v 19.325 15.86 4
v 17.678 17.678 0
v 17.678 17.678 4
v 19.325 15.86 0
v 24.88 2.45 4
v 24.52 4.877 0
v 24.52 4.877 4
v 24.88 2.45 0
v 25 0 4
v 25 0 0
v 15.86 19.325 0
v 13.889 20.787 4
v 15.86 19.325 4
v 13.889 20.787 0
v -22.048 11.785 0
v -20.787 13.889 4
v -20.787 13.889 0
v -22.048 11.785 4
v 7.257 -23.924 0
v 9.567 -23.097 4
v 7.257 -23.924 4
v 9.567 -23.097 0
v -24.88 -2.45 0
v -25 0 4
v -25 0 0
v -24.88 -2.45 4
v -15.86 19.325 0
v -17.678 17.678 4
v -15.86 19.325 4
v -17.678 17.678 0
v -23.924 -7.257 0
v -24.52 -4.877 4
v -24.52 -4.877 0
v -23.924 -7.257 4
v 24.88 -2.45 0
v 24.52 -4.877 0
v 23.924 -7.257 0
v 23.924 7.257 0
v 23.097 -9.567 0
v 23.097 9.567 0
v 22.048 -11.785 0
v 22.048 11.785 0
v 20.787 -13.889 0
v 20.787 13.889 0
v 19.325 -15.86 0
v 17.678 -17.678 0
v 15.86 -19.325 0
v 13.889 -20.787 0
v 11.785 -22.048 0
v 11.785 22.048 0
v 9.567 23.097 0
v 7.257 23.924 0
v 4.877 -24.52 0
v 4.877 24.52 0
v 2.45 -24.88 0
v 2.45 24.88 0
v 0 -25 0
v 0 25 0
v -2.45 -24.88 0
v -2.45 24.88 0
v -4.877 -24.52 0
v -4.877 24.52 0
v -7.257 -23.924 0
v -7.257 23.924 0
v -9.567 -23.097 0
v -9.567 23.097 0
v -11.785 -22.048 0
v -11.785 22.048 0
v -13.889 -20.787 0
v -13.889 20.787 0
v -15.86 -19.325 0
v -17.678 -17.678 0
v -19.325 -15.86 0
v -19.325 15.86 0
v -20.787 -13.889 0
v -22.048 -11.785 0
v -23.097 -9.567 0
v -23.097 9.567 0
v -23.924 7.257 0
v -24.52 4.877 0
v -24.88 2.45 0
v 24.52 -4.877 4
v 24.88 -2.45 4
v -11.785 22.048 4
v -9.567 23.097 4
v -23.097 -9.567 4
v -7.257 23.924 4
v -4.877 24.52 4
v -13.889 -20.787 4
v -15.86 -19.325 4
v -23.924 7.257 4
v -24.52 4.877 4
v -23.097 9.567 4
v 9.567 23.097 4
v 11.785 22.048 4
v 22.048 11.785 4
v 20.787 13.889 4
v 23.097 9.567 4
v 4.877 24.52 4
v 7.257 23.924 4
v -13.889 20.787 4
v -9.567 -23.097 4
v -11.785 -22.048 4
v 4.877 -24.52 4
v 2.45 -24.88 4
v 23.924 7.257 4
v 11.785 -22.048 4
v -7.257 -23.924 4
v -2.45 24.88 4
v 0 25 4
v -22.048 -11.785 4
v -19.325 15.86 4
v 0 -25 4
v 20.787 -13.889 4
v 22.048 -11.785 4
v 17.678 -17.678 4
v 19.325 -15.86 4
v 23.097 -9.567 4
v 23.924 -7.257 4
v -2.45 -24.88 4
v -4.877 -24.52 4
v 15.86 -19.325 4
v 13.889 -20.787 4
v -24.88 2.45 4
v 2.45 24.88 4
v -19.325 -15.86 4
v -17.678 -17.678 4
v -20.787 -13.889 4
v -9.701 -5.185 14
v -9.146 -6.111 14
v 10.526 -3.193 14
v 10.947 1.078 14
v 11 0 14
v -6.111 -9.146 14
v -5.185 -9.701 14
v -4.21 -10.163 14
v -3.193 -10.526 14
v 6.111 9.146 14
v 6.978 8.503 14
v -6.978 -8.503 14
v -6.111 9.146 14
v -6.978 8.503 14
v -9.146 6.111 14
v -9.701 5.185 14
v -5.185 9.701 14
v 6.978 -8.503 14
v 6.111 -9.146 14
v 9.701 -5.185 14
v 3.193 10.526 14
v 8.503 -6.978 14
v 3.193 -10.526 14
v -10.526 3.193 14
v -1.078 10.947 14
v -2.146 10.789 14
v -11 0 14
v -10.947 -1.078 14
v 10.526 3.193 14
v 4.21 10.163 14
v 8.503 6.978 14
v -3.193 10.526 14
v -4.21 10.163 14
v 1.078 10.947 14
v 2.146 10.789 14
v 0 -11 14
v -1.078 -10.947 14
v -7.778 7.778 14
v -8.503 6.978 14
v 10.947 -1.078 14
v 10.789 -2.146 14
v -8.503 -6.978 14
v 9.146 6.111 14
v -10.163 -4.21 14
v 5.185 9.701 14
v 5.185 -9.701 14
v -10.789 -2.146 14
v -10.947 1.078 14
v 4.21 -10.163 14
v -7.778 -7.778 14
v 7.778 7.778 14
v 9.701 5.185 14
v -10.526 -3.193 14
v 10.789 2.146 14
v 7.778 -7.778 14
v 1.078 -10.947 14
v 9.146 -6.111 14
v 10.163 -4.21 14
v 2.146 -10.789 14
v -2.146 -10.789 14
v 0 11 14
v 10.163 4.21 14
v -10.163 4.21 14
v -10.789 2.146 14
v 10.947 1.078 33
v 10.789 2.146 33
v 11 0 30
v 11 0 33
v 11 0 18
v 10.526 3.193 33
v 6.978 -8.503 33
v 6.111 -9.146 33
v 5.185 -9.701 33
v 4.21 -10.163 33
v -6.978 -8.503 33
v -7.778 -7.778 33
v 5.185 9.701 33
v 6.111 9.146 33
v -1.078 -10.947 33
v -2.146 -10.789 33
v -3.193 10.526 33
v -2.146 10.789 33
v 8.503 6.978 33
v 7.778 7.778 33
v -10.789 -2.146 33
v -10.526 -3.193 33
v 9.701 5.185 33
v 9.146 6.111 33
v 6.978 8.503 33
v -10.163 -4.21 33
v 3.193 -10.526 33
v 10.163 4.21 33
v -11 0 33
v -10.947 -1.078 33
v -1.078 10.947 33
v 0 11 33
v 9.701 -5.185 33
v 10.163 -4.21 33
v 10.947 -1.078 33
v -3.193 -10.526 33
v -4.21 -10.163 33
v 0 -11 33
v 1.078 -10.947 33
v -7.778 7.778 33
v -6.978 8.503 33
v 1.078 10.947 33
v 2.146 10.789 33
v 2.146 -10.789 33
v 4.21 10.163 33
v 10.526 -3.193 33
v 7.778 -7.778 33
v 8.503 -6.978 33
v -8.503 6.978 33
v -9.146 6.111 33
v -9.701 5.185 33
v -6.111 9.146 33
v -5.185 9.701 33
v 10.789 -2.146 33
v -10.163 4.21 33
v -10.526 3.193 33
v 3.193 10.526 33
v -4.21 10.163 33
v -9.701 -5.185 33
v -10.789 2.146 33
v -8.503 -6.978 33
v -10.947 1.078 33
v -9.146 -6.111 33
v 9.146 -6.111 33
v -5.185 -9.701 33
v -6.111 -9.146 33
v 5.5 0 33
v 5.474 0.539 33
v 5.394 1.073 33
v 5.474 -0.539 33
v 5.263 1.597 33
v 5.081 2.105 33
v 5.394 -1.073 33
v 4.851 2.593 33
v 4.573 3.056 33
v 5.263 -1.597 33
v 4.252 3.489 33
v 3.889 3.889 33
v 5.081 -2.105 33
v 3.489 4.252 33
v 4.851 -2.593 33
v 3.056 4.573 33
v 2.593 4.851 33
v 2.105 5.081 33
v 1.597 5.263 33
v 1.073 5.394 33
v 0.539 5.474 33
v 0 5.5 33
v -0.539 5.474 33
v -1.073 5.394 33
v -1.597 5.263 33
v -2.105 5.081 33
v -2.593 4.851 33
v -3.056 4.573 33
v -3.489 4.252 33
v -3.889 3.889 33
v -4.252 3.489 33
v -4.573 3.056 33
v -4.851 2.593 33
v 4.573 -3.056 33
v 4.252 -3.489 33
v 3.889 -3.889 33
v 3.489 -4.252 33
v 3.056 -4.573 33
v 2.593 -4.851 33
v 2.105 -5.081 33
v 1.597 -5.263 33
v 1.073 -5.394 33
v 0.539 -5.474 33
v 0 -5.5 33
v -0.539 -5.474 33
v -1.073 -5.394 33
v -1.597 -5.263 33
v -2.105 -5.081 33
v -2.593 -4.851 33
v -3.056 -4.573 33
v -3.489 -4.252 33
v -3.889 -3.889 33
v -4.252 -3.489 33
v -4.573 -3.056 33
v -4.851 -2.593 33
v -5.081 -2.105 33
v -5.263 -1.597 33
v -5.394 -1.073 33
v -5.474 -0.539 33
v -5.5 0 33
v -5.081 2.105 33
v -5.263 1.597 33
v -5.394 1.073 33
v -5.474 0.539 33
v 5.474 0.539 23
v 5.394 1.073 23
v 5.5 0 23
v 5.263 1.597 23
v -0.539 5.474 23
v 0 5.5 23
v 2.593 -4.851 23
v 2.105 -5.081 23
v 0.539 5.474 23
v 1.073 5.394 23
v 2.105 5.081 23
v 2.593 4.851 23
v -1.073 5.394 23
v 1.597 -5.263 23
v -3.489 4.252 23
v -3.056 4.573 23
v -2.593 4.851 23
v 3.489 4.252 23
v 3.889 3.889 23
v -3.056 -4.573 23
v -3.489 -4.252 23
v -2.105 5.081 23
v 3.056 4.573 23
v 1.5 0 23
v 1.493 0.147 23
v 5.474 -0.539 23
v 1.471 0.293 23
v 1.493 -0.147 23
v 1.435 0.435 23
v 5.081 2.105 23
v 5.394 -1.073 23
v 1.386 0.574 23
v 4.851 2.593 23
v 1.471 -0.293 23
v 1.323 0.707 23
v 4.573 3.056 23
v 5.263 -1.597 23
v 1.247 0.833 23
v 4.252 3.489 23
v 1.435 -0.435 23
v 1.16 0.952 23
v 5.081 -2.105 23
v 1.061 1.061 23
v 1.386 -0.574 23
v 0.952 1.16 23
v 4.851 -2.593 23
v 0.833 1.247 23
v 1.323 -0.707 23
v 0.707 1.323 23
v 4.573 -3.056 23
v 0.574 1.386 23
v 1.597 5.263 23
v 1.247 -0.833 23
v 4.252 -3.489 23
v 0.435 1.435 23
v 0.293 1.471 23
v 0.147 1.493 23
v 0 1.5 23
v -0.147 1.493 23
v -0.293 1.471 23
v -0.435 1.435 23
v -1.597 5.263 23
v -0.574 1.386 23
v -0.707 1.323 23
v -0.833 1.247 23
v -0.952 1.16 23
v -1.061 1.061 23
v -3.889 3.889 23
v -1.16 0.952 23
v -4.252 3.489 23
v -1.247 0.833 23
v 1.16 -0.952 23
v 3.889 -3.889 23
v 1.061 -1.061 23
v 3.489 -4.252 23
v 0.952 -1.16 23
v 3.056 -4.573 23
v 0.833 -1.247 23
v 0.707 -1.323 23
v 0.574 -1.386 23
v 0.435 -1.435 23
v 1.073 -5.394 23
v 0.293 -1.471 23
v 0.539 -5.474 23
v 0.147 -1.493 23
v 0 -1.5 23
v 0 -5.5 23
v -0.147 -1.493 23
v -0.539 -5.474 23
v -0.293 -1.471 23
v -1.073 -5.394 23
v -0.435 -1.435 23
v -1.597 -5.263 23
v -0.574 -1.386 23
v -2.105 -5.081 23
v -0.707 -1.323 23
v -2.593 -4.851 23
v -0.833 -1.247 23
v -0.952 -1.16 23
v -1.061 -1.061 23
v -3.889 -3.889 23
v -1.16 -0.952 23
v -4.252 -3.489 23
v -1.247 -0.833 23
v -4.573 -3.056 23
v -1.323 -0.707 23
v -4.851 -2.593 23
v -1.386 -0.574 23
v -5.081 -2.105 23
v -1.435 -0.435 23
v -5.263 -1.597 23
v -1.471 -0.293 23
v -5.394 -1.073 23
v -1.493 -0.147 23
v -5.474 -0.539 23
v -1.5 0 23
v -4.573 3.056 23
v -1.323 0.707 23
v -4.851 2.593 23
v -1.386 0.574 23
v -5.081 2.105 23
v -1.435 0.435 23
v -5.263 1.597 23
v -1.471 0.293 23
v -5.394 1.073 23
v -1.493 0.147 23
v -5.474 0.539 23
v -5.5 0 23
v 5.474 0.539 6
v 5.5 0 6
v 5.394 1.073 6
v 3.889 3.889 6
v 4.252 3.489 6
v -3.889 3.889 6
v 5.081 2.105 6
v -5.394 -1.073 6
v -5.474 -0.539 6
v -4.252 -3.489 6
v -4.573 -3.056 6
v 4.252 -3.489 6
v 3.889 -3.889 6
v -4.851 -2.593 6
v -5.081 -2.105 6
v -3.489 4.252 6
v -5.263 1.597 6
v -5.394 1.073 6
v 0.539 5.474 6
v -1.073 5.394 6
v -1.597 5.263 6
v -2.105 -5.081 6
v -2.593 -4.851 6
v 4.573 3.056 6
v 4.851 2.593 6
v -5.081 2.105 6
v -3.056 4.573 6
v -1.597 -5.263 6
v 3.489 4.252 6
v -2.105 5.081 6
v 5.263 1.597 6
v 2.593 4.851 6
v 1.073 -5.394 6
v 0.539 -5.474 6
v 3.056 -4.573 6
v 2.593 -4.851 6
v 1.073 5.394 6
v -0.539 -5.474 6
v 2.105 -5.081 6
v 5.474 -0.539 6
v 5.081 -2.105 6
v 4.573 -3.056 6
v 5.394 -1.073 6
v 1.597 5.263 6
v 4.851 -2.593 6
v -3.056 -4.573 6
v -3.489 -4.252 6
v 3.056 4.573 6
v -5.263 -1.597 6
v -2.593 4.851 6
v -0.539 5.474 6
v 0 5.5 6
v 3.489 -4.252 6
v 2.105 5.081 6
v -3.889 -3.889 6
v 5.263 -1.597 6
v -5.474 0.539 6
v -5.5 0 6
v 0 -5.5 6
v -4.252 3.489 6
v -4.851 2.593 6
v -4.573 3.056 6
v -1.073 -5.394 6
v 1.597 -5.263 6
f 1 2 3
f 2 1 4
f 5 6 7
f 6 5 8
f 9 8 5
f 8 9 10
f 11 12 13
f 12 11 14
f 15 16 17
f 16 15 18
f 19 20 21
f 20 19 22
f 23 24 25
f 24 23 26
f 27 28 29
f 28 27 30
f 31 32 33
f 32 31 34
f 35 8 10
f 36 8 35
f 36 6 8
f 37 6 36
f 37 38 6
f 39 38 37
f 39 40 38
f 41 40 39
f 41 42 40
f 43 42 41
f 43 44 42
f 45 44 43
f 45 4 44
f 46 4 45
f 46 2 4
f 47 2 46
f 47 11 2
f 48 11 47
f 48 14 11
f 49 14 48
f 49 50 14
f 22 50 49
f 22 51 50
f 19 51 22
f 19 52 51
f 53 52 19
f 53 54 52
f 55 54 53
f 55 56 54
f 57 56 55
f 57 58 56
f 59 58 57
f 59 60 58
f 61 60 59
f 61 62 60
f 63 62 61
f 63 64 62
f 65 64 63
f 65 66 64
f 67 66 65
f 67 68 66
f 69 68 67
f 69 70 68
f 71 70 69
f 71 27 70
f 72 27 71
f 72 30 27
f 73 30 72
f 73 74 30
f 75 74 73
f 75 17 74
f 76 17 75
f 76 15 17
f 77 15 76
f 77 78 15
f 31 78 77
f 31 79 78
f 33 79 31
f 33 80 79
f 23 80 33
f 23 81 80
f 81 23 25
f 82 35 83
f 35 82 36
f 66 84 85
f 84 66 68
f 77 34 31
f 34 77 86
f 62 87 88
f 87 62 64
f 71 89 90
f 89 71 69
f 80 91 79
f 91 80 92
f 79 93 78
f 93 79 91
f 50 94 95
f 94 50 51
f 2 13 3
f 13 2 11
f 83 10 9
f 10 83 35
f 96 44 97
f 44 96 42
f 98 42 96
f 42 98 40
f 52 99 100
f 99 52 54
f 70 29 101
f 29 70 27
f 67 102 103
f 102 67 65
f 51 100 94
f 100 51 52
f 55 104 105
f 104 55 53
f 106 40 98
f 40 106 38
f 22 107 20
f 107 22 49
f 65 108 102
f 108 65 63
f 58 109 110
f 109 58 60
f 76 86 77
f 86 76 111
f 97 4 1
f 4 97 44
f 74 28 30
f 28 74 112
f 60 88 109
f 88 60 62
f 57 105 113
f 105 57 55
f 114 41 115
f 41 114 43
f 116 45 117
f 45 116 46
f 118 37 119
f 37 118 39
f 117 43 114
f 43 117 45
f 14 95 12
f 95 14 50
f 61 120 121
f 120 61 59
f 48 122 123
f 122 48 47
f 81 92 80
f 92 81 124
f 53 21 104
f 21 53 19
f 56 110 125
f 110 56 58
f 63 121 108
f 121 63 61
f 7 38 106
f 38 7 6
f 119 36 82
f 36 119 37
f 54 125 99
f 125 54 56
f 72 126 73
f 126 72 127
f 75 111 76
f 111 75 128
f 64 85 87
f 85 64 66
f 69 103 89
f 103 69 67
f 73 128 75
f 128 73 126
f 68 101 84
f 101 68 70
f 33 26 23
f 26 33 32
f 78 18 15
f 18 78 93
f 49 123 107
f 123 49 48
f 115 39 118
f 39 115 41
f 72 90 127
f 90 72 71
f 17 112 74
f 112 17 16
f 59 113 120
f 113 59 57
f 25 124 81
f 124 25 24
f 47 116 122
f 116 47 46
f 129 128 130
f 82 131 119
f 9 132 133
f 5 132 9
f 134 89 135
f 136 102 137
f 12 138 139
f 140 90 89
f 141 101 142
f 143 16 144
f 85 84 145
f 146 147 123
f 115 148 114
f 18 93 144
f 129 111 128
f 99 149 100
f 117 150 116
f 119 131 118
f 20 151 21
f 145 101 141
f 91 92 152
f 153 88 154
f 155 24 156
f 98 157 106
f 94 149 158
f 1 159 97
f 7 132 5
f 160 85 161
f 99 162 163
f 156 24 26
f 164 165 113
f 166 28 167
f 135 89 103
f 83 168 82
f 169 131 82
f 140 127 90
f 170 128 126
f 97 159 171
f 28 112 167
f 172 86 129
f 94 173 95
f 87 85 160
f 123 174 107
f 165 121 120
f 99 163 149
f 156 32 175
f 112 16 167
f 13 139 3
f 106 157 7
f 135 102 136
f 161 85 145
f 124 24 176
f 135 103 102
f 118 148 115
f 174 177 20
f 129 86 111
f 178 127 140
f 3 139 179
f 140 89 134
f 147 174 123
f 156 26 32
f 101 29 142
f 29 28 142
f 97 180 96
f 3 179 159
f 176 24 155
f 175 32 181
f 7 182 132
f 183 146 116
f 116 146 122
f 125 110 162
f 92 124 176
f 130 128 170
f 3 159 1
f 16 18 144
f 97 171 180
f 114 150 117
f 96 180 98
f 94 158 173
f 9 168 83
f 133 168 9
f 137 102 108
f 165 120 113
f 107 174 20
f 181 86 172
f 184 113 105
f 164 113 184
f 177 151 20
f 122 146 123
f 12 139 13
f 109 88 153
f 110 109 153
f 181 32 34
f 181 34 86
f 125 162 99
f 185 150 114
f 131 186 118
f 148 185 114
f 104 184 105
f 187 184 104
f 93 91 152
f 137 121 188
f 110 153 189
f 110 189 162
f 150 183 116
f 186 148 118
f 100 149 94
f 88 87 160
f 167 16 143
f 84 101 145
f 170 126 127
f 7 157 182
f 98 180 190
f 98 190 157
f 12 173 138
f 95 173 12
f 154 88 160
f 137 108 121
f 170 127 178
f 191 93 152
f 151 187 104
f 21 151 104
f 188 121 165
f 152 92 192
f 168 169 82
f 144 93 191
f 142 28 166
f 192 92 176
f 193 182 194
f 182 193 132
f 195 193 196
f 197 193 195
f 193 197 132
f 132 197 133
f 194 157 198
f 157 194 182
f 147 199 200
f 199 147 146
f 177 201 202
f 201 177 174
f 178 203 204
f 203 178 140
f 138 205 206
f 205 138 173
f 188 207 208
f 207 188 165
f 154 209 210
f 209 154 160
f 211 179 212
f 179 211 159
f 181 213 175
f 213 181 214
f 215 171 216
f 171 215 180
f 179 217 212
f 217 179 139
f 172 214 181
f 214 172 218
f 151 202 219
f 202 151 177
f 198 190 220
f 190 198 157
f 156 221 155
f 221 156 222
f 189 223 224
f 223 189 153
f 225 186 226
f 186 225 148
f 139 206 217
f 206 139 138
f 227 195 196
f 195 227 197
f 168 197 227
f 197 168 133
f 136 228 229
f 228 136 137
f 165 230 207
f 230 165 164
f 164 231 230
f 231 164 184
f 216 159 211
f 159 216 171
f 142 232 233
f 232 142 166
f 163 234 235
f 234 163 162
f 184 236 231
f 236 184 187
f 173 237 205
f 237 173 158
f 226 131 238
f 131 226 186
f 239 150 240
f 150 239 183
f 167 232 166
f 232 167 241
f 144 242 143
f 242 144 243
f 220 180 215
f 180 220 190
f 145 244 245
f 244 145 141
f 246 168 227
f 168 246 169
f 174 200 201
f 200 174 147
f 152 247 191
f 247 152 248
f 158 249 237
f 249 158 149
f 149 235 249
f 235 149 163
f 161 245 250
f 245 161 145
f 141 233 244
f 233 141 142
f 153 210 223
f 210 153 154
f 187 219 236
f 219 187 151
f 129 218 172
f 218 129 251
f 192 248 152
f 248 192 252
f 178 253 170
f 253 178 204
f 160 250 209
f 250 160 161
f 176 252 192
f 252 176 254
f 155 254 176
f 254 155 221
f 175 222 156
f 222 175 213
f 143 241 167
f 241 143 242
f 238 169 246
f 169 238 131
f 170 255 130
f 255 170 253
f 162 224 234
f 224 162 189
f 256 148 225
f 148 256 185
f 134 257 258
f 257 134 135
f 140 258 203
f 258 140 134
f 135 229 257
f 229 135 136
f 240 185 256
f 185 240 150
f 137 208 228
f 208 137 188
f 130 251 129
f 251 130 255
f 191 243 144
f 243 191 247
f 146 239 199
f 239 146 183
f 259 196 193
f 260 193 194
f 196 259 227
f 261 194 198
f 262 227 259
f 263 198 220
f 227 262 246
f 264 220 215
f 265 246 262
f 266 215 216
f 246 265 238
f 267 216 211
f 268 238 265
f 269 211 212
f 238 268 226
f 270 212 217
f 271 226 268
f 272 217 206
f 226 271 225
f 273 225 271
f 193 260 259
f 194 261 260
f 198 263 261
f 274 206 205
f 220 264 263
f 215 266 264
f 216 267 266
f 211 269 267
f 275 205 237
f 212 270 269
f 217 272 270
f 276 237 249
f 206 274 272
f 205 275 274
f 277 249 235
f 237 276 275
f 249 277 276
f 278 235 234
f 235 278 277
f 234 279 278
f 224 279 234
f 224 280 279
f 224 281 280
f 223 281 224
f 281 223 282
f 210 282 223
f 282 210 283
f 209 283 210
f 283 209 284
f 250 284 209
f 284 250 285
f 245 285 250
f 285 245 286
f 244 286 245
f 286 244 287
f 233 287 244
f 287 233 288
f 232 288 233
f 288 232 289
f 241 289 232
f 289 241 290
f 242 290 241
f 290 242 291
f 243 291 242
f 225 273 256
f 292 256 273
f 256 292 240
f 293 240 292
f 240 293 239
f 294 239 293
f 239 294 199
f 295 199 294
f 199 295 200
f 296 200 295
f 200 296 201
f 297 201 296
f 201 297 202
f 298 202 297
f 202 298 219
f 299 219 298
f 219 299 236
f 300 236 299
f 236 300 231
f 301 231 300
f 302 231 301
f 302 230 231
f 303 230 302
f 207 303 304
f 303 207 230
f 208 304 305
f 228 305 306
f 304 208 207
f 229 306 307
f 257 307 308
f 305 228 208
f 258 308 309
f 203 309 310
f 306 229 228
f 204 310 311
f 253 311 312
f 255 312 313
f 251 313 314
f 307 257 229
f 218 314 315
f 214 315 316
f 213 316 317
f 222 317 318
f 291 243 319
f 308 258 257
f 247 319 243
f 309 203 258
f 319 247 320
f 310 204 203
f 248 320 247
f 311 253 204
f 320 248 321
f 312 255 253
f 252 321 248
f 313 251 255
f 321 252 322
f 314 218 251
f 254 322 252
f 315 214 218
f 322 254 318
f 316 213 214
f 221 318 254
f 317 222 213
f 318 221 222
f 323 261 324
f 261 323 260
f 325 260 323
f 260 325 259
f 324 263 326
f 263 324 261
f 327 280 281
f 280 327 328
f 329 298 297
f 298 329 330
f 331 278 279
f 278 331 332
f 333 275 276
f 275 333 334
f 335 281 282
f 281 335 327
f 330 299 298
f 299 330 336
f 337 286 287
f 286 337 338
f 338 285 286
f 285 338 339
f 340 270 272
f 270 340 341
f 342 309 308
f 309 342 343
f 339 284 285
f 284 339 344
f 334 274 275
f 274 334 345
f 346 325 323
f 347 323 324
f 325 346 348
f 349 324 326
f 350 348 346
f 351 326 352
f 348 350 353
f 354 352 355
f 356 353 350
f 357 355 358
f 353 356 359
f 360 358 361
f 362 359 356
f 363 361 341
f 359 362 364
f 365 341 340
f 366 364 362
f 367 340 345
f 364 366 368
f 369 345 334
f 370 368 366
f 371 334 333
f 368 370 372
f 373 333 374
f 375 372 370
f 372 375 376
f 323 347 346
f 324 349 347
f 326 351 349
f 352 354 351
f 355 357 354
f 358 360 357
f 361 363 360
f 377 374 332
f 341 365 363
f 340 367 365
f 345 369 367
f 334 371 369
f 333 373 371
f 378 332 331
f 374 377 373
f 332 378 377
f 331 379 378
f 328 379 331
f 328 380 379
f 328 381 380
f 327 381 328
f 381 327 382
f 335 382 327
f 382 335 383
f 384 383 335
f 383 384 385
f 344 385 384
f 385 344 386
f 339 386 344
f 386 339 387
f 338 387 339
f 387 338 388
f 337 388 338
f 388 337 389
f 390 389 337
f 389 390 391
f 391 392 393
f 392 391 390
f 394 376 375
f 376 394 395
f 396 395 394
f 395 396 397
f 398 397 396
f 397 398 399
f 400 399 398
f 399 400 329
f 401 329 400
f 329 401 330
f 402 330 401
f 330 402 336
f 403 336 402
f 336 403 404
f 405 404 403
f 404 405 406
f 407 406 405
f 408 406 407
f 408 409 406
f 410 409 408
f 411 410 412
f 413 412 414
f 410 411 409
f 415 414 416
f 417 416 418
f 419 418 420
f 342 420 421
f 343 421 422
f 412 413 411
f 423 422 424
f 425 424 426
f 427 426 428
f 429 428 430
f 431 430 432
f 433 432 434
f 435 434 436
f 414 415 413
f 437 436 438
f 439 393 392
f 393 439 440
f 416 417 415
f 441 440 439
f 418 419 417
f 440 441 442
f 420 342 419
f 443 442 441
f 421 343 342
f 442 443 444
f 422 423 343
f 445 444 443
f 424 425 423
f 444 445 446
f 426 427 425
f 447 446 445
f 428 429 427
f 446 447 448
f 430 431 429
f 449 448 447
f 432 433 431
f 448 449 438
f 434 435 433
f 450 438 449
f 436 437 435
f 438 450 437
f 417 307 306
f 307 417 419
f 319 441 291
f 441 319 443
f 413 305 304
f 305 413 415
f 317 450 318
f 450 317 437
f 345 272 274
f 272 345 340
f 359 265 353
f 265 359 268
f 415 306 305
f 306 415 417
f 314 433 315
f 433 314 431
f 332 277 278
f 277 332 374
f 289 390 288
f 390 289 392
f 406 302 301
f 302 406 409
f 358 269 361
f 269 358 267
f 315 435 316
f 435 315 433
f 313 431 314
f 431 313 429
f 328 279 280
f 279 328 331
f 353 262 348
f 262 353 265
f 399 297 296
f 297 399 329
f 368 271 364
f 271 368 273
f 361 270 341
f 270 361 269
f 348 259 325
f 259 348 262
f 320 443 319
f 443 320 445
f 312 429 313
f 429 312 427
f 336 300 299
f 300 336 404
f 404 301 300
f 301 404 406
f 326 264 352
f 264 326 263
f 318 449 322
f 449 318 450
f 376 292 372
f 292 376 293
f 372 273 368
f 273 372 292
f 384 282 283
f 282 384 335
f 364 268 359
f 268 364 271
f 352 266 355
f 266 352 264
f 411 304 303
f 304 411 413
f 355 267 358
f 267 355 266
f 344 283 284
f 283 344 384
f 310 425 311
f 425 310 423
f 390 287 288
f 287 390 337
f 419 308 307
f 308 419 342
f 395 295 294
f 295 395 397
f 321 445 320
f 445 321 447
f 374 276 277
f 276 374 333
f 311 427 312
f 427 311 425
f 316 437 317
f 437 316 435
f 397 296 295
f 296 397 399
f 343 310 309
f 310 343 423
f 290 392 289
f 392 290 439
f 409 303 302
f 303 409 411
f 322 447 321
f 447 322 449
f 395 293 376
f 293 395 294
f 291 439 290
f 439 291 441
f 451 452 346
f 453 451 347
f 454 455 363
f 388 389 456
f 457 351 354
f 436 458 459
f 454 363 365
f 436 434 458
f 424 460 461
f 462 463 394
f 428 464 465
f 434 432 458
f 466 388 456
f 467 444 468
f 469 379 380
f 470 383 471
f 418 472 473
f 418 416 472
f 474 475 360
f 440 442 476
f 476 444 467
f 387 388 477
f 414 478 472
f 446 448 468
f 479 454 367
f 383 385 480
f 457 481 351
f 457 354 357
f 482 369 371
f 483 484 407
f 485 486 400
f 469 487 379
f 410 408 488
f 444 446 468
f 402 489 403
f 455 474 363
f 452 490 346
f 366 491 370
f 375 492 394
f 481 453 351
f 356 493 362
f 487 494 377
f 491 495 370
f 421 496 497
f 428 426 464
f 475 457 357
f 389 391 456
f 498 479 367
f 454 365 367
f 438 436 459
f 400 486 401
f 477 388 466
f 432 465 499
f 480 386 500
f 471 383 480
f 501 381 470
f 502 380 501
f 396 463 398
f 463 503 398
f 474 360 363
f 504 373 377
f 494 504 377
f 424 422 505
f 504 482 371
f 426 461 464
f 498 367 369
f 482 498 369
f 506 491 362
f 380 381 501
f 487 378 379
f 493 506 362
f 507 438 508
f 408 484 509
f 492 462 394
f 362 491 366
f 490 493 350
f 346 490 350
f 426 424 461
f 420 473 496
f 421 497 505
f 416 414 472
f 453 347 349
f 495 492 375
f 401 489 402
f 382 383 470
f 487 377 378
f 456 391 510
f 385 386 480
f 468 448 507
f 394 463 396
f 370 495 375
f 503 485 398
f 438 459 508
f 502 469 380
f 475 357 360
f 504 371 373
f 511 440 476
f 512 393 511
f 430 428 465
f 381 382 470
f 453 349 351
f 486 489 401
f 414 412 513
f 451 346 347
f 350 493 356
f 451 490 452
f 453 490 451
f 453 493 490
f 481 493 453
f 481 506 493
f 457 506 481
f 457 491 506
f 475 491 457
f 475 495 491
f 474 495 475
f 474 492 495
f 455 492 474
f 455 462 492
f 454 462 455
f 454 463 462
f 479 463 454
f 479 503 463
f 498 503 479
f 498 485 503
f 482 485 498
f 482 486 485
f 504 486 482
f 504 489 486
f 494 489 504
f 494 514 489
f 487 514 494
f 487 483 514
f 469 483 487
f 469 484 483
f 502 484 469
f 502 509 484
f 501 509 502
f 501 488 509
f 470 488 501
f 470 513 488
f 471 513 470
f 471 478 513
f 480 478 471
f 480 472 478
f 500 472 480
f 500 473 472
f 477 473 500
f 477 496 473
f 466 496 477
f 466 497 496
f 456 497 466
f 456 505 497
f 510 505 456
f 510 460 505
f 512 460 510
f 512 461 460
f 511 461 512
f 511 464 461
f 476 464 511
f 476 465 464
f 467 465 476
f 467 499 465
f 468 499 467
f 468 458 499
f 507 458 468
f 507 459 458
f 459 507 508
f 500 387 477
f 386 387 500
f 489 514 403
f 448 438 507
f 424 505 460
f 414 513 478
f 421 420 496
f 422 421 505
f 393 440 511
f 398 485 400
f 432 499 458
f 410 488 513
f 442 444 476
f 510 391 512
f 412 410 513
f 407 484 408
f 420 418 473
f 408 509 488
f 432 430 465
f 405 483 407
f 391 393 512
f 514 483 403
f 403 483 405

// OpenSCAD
// 1.5 mL microcentrifuge tube stand for an analytical balance
// Printed standing up: rests on XY plane at z = 0, builds upward (+Z), centred on origin.

$fn = 64;

// ---- Overall body dimensions (mm) ----
base_d     = 50;   // base disc diameter
base_h     = 4;    // base disc height (z = 0 .. 4)
cone_top_d = 22;   // cone narrows to this diameter at z = 14
cone_h     = 10;   // cone height (z = 4 .. 14)
col_d      = 22;   // column diameter
col_h      = 19;   // column height (z = 14 .. 33)
top_z      = 33;   // top of the stand

// ---- Tube seat (bore) dimensions ----
seat_d = 11;       // seat bore diameter (z = 33 .. 23)
seat_h = 10;       // seat bore height (z = 23 .. 33)
tip_d  = 3;        // cone bore narrows to this at z = 6
tip_h  = 17;       // cone bore height (z = 6 .. 23)

// ---- Viewing window dimensions ----
win_w  = 4;        // window width in Y
win_z0 = 18;       // window bottom z
win_z1 = 30;       // window top z
win_h  = win_z1 - win_z0;

// ---- Build the solid body (base + cone + column) ----
module body() { union() {
    // base disc
    translate([0, 0, 0])
        cylinder(h = base_h, d = base_d);

    // cone narrowing from base_d to cone_top_d
    translate([0, 0, base_h])
        cylinder(h = cone_h, d1 = base_d, d2 = cone_top_d);

    // column
    translate([0, 0, base_h + cone_h])
        cylinder(h = col_h, d = col_d);
} }

// ---- Tube seat bore (cylinder + cone), extended 1 mm past the top ----
module seat() { union() {
    // seat cylinder: z = 23 .. 34 (1 mm past top at 33)
    translate([0, 0, 23])
        cylinder(h = 11, d = seat_d);

    // cone: z = 6 .. 23, narrowing from seat_d to tip_d
    translate([0, 0, 6])
        cylinder(h = tip_h, d1 = seat_d, d2 = tip_d);
} }

// ---- Viewing window: straight through the +X column wall, from the seat to the outside ----
// Box starts at the column outer wall (x = 11) and extends past it, so it removes only the
// +X wall and does not reach the seat bore (which ends at x = 5.5). This keeps the bore
// centred and the window a clean slot through the wall.
module window() { translate([11, -win_w / 2, win_z0])
    cube([1, win_w, win_h]); }

// ---- Final part: body minus seat bore minus viewing window ----
difference() {
    body();
    seat();
    window();
}
